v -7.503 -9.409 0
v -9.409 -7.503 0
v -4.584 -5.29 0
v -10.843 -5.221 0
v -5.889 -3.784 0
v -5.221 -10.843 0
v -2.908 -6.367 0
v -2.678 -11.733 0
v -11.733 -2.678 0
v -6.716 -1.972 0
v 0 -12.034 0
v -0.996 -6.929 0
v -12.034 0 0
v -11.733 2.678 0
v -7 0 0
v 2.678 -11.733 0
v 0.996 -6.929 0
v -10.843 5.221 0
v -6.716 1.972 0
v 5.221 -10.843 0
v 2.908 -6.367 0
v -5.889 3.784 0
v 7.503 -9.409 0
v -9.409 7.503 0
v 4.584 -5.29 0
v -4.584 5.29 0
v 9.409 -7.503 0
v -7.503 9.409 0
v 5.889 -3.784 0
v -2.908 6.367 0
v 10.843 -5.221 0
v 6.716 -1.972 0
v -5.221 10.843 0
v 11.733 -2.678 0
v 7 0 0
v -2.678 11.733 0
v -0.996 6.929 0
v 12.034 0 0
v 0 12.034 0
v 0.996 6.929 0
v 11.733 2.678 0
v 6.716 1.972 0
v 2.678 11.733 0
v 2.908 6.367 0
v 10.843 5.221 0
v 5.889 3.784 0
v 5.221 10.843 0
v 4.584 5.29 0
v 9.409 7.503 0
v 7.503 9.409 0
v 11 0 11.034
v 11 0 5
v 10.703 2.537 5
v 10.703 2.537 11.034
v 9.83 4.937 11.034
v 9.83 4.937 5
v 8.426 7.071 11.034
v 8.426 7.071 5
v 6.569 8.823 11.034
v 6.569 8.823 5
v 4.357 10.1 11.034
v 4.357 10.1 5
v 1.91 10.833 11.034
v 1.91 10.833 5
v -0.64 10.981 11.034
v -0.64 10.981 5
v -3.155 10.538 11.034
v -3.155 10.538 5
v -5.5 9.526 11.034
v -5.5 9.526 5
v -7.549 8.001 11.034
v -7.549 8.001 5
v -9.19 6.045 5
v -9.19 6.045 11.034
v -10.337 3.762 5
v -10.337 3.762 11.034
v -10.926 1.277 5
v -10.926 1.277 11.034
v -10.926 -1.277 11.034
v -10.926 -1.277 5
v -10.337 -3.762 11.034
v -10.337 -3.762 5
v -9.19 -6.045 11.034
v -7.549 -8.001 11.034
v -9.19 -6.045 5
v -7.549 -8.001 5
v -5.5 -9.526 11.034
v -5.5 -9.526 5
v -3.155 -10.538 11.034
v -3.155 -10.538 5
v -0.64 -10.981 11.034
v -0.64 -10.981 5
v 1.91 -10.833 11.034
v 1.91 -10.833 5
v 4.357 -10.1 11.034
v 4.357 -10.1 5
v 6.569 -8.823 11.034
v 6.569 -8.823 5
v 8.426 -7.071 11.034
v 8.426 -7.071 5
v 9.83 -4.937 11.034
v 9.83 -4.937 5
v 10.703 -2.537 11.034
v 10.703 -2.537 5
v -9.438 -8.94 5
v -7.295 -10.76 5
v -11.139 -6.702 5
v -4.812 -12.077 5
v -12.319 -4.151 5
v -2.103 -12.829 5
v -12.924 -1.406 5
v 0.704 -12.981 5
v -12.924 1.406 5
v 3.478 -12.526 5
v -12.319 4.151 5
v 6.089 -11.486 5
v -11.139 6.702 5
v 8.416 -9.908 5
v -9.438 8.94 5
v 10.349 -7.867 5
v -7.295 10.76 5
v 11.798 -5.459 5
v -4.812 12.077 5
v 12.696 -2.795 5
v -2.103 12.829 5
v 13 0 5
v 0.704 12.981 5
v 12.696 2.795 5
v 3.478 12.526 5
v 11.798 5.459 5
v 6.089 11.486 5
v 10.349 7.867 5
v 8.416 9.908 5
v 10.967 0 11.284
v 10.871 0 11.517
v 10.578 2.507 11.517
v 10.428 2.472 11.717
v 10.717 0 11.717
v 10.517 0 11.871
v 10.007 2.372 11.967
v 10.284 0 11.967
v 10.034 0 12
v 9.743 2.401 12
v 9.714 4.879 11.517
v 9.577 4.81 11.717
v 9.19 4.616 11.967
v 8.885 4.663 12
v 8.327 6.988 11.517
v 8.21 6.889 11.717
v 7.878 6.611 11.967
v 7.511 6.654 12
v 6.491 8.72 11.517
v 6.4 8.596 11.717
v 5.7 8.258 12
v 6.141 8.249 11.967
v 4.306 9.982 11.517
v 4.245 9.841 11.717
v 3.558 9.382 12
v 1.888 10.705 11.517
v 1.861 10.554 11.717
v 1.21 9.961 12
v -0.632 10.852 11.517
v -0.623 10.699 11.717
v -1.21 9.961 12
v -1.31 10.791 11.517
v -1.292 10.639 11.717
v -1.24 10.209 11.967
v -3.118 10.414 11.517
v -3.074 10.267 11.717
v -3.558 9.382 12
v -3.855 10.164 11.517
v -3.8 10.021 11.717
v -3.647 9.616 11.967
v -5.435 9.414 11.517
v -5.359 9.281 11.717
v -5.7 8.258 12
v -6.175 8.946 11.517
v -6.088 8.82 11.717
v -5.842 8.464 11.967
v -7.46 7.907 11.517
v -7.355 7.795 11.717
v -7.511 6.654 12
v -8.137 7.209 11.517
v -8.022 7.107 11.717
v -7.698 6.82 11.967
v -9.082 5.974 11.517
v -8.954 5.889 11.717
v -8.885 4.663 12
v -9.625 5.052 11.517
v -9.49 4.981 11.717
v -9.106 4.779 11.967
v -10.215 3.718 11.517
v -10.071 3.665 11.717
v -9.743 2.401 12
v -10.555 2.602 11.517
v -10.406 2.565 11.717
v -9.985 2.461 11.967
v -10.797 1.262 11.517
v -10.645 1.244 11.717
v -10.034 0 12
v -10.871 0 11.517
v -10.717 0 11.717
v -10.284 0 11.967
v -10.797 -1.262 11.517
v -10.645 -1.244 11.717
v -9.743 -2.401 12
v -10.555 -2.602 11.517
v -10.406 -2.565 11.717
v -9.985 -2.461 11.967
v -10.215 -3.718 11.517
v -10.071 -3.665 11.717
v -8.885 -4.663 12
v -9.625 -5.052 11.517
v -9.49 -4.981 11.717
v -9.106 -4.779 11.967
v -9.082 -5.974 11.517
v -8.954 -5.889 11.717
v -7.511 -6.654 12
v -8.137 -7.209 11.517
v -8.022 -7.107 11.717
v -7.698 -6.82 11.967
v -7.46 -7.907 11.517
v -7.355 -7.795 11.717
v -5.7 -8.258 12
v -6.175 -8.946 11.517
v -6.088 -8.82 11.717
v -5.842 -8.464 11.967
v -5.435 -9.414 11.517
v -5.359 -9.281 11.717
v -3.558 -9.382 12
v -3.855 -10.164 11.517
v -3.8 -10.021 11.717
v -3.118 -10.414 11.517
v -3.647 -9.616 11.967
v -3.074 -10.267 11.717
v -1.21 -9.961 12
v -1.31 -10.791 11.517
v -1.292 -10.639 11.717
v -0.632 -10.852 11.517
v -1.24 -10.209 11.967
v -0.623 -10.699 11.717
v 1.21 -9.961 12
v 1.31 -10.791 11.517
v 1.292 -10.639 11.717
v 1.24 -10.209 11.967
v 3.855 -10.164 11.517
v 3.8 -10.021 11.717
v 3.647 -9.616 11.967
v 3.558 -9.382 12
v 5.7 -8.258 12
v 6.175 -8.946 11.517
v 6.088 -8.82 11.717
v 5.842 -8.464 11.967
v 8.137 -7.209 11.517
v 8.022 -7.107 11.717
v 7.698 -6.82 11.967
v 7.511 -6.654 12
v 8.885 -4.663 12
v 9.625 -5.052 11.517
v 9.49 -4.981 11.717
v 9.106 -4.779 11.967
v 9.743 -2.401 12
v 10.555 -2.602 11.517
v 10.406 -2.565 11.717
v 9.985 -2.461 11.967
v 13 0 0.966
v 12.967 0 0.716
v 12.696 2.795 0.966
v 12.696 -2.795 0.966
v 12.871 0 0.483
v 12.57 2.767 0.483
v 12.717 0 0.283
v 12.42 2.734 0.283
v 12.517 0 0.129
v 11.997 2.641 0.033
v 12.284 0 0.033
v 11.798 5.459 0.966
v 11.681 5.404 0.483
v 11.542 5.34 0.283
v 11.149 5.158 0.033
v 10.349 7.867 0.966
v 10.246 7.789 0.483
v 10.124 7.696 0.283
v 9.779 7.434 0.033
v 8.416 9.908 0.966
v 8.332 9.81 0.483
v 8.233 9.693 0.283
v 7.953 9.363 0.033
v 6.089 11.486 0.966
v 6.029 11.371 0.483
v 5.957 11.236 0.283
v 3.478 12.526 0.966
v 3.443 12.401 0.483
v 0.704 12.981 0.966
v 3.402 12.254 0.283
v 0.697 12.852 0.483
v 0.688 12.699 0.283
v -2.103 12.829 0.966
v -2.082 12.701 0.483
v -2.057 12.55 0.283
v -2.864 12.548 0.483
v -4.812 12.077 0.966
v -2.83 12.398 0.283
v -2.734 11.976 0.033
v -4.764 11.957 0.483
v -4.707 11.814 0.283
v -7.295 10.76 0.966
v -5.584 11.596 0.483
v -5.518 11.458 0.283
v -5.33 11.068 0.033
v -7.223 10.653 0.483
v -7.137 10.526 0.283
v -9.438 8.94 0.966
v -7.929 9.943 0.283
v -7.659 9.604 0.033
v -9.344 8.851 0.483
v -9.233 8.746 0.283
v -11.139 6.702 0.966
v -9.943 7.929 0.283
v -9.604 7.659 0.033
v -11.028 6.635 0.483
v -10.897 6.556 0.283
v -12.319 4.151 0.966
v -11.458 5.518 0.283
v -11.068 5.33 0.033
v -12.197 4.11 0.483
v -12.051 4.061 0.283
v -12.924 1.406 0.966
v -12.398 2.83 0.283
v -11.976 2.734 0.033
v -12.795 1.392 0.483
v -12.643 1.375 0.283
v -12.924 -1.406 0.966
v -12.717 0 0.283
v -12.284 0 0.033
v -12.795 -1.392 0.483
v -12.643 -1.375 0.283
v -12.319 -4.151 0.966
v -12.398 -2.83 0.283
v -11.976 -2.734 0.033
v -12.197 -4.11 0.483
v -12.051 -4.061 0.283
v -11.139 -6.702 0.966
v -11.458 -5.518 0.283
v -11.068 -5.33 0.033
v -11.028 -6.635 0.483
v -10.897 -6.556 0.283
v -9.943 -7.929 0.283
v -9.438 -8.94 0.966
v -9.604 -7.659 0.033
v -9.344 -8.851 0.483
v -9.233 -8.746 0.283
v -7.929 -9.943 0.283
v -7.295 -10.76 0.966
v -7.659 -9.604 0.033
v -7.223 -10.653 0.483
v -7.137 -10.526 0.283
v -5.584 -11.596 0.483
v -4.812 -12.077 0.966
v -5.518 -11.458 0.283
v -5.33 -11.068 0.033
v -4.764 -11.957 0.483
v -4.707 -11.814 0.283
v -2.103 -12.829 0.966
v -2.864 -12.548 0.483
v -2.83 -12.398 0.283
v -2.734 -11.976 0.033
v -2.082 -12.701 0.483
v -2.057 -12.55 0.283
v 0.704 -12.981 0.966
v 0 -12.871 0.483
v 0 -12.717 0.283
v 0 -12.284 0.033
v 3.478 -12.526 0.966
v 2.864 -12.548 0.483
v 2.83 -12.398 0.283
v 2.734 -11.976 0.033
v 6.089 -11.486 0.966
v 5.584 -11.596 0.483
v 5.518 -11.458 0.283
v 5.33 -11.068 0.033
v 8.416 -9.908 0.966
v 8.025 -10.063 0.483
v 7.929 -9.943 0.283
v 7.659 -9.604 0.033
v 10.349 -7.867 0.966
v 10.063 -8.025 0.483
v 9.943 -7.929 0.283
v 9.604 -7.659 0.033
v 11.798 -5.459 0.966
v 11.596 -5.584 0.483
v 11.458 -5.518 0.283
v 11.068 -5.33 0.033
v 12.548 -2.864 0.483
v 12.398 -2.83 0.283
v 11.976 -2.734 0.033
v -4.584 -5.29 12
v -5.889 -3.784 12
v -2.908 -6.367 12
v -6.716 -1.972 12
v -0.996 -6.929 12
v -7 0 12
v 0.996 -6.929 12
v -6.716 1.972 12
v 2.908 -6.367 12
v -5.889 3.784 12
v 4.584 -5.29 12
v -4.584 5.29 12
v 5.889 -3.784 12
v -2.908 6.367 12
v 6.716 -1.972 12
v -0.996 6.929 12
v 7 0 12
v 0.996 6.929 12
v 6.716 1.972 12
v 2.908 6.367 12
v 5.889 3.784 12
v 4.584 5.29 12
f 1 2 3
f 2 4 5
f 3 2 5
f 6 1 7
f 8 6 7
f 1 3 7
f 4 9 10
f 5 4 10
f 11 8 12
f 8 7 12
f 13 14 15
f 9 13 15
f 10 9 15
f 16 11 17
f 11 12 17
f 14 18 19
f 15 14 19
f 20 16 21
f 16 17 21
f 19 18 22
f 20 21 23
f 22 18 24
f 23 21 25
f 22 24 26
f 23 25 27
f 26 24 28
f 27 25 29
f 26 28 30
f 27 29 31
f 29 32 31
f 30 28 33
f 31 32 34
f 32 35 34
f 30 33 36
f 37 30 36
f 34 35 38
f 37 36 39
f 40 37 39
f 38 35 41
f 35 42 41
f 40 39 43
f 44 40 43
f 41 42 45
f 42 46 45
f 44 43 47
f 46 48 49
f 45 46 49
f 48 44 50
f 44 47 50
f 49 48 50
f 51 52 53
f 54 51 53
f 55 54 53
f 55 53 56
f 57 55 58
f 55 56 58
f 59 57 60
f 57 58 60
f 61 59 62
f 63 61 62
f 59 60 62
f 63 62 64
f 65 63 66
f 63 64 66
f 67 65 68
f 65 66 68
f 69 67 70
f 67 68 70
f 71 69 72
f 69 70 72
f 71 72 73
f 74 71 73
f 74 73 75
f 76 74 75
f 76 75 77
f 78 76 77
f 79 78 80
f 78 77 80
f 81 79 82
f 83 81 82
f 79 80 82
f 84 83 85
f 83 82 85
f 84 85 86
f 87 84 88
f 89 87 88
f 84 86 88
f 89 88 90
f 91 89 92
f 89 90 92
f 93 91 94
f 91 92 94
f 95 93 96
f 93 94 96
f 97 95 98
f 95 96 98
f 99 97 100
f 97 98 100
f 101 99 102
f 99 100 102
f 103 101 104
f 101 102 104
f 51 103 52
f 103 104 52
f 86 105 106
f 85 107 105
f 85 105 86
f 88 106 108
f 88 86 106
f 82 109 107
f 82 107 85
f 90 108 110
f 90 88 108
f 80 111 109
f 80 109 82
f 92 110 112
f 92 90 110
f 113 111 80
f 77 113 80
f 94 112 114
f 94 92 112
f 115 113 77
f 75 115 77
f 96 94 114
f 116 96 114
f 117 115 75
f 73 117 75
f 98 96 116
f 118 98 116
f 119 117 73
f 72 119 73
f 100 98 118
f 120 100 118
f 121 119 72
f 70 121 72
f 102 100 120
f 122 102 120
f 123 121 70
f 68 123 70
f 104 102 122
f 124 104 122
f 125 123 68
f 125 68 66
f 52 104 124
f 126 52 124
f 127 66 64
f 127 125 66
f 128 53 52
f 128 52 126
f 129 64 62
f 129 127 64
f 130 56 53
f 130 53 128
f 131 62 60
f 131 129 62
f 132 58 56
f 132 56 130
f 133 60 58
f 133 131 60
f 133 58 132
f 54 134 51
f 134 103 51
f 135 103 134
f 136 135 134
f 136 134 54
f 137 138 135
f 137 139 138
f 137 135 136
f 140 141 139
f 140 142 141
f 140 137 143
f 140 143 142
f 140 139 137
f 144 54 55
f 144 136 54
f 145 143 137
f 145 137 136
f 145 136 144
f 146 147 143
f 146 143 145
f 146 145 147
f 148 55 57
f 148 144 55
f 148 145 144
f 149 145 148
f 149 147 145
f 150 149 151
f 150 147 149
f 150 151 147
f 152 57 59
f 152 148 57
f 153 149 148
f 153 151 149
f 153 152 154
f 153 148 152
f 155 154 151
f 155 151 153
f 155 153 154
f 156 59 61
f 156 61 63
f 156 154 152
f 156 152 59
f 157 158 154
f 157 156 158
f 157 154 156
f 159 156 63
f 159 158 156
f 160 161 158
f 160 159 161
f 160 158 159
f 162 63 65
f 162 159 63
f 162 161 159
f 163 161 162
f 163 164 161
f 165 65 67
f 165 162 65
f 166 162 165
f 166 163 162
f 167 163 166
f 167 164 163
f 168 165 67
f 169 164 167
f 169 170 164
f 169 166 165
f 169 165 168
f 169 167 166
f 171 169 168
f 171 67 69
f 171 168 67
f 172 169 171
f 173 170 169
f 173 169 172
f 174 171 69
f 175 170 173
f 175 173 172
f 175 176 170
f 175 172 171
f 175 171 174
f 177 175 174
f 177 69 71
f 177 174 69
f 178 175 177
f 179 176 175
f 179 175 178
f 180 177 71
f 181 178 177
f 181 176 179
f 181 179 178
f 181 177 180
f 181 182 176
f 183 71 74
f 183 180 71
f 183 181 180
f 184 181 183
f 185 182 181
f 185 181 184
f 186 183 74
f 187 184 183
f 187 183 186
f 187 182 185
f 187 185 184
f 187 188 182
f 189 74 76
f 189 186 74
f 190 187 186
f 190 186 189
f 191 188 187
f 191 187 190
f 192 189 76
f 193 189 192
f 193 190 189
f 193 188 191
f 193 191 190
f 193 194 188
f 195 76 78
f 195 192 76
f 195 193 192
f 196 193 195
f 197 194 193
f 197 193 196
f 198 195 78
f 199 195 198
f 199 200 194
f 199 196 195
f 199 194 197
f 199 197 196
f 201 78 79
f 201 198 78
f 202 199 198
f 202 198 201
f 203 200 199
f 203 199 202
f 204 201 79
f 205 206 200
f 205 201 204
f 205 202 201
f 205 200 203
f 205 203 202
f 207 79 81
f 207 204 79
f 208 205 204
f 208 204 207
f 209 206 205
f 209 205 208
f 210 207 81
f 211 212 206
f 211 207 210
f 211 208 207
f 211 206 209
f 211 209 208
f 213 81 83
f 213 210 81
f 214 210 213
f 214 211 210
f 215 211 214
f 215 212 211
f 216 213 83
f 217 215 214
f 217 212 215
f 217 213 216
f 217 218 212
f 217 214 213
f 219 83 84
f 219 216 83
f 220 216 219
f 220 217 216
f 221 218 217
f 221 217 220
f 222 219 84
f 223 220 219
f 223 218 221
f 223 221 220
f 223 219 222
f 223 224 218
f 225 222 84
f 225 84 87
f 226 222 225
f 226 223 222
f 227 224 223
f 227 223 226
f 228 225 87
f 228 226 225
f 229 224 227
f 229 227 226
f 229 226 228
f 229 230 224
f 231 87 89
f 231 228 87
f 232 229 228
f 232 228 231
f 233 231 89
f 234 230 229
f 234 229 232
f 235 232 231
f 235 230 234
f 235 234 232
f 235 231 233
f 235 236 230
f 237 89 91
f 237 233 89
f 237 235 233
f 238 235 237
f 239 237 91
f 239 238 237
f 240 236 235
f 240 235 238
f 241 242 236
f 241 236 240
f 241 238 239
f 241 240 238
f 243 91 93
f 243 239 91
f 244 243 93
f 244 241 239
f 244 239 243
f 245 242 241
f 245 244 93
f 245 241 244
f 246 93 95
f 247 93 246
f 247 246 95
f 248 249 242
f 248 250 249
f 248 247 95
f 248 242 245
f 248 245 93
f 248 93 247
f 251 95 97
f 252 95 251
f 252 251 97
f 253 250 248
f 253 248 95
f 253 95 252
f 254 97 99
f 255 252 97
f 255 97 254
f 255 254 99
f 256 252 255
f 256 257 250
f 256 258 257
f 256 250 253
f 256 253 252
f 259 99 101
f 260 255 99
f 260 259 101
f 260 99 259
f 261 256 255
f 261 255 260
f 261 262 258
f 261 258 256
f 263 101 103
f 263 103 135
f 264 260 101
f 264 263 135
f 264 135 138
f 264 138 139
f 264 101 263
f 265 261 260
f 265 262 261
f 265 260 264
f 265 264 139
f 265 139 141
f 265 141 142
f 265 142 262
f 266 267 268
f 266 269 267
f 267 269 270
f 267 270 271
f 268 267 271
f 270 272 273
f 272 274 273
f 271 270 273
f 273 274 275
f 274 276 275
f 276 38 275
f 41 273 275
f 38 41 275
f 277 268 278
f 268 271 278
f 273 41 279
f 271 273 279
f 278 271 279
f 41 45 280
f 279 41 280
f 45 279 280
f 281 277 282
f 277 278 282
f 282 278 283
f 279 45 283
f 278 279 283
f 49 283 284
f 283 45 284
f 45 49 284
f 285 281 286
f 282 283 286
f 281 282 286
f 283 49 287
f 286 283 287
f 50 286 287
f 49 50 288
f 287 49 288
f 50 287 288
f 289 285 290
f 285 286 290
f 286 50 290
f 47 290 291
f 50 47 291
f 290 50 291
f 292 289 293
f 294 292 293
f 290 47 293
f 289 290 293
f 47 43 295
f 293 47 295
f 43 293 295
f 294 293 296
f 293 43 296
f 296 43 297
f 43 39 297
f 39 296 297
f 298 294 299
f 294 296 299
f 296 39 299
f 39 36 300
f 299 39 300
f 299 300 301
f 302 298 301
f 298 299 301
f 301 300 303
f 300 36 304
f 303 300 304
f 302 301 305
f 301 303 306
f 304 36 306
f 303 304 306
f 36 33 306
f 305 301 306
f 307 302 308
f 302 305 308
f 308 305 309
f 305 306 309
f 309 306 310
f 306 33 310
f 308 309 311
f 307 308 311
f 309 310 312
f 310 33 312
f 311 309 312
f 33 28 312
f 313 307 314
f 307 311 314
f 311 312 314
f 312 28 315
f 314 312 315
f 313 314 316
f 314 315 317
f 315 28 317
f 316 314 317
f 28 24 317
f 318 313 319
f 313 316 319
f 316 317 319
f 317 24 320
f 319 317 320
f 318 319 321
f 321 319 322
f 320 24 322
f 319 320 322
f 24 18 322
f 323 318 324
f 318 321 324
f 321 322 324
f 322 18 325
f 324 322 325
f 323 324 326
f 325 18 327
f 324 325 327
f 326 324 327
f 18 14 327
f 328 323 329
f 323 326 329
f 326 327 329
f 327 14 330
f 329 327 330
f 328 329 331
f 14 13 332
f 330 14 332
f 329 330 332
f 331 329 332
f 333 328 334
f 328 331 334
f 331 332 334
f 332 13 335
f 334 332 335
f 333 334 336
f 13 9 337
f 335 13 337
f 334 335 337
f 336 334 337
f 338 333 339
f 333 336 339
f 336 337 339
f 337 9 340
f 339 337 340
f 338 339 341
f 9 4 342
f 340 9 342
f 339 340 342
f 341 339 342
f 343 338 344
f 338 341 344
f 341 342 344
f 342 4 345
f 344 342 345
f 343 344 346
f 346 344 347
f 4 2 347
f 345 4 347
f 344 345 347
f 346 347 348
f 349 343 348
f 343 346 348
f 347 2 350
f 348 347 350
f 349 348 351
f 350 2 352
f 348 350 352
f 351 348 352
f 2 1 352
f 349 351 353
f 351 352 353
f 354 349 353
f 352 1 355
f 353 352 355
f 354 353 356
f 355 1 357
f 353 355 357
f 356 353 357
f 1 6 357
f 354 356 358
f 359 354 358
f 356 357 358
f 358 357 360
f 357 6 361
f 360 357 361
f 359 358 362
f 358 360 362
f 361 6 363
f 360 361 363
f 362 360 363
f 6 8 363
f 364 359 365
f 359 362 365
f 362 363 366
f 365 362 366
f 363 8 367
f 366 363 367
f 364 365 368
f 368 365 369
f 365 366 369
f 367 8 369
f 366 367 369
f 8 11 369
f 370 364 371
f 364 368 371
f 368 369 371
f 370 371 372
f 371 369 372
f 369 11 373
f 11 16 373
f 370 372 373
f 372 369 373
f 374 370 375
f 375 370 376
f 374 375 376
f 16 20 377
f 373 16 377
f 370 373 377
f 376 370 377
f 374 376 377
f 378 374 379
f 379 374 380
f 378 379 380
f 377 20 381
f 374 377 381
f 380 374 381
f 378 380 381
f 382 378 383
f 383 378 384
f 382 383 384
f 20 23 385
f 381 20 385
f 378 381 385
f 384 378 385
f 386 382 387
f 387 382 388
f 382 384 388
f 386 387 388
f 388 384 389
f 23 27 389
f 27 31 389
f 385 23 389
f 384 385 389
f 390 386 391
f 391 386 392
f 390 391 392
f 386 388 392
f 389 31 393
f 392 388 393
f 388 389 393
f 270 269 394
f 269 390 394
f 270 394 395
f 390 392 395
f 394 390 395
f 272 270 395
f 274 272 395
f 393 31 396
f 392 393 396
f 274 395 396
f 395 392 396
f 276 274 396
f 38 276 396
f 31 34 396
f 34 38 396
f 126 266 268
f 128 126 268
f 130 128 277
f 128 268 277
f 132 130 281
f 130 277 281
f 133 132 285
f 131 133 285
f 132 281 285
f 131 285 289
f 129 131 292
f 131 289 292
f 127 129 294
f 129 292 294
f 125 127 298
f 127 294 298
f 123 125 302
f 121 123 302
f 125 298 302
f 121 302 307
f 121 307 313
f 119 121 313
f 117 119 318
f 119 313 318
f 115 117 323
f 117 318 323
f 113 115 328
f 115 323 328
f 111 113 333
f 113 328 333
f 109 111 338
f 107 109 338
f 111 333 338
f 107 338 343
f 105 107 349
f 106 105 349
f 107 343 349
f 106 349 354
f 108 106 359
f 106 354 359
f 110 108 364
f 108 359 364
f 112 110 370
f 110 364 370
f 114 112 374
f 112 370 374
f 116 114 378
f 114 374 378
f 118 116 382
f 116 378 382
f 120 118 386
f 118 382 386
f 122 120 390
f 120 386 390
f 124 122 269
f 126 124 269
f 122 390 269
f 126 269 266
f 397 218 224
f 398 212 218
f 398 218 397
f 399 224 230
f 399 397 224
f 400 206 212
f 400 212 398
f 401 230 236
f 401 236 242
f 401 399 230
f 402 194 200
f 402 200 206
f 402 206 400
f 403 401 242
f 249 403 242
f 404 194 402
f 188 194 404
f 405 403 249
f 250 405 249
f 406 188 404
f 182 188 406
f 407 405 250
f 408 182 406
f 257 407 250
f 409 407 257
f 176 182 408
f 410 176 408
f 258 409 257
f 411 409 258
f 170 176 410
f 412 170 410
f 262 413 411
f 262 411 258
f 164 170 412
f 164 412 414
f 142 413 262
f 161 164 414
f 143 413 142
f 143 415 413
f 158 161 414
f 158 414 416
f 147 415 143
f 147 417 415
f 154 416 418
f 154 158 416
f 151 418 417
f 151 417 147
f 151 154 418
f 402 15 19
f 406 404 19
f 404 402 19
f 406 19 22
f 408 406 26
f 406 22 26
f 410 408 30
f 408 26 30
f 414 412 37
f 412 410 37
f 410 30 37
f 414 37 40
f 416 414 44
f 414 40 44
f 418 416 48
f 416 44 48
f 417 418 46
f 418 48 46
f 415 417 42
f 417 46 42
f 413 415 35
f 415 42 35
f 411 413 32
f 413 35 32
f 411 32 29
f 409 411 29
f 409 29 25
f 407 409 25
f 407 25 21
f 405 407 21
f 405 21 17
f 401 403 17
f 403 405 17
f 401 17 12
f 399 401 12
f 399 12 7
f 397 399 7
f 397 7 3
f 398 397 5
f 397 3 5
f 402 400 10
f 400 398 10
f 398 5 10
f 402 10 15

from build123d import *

# Parameters (mm, degrees)
F0_R           = 13
F1_DEPTH       = 5
F2_R           = 11
F3_DEPTH       = 7
F5_D           = 14
F5_CBORE_D     = 14
F5_CBORE_DEPTH = 14
F6_R           = 0.965685
F7_R           = 0.965685


with BuildPart() as f1:
    # F0 (on Top) → F1 (new body)
    with BuildSketch(Plane.XY):
        Circle(F0_R)
    extrude(amount=F1_DEPTH)

    # F2 (on face) → F3 (join)
    with BuildSketch(Plane.XY.offset(5)):
        Circle(F2_R)
    extrude(amount=F3_DEPTH)

    # F5 (through all)
    with Locations(Plane.XY.offset(12)):
        with Locations((0, 0)):
            CounterBoreHole(F5_D / 2, F5_CBORE_D / 2, F5_CBORE_DEPTH)

    # F6
    f6_edges = [f1.edges().sort_by_distance(p)[0] for p in [
        (-11, 0, 12),
    ]]
    fillet(f6_edges, radius=F6_R)

    # F7
    f7_edges = [f1.edges().sort_by_distance(p)[0] for p in [
        (-13, 0, 0),
    ]]
    fillet(f7_edges, radius=F7_R)


solid = f1.part
